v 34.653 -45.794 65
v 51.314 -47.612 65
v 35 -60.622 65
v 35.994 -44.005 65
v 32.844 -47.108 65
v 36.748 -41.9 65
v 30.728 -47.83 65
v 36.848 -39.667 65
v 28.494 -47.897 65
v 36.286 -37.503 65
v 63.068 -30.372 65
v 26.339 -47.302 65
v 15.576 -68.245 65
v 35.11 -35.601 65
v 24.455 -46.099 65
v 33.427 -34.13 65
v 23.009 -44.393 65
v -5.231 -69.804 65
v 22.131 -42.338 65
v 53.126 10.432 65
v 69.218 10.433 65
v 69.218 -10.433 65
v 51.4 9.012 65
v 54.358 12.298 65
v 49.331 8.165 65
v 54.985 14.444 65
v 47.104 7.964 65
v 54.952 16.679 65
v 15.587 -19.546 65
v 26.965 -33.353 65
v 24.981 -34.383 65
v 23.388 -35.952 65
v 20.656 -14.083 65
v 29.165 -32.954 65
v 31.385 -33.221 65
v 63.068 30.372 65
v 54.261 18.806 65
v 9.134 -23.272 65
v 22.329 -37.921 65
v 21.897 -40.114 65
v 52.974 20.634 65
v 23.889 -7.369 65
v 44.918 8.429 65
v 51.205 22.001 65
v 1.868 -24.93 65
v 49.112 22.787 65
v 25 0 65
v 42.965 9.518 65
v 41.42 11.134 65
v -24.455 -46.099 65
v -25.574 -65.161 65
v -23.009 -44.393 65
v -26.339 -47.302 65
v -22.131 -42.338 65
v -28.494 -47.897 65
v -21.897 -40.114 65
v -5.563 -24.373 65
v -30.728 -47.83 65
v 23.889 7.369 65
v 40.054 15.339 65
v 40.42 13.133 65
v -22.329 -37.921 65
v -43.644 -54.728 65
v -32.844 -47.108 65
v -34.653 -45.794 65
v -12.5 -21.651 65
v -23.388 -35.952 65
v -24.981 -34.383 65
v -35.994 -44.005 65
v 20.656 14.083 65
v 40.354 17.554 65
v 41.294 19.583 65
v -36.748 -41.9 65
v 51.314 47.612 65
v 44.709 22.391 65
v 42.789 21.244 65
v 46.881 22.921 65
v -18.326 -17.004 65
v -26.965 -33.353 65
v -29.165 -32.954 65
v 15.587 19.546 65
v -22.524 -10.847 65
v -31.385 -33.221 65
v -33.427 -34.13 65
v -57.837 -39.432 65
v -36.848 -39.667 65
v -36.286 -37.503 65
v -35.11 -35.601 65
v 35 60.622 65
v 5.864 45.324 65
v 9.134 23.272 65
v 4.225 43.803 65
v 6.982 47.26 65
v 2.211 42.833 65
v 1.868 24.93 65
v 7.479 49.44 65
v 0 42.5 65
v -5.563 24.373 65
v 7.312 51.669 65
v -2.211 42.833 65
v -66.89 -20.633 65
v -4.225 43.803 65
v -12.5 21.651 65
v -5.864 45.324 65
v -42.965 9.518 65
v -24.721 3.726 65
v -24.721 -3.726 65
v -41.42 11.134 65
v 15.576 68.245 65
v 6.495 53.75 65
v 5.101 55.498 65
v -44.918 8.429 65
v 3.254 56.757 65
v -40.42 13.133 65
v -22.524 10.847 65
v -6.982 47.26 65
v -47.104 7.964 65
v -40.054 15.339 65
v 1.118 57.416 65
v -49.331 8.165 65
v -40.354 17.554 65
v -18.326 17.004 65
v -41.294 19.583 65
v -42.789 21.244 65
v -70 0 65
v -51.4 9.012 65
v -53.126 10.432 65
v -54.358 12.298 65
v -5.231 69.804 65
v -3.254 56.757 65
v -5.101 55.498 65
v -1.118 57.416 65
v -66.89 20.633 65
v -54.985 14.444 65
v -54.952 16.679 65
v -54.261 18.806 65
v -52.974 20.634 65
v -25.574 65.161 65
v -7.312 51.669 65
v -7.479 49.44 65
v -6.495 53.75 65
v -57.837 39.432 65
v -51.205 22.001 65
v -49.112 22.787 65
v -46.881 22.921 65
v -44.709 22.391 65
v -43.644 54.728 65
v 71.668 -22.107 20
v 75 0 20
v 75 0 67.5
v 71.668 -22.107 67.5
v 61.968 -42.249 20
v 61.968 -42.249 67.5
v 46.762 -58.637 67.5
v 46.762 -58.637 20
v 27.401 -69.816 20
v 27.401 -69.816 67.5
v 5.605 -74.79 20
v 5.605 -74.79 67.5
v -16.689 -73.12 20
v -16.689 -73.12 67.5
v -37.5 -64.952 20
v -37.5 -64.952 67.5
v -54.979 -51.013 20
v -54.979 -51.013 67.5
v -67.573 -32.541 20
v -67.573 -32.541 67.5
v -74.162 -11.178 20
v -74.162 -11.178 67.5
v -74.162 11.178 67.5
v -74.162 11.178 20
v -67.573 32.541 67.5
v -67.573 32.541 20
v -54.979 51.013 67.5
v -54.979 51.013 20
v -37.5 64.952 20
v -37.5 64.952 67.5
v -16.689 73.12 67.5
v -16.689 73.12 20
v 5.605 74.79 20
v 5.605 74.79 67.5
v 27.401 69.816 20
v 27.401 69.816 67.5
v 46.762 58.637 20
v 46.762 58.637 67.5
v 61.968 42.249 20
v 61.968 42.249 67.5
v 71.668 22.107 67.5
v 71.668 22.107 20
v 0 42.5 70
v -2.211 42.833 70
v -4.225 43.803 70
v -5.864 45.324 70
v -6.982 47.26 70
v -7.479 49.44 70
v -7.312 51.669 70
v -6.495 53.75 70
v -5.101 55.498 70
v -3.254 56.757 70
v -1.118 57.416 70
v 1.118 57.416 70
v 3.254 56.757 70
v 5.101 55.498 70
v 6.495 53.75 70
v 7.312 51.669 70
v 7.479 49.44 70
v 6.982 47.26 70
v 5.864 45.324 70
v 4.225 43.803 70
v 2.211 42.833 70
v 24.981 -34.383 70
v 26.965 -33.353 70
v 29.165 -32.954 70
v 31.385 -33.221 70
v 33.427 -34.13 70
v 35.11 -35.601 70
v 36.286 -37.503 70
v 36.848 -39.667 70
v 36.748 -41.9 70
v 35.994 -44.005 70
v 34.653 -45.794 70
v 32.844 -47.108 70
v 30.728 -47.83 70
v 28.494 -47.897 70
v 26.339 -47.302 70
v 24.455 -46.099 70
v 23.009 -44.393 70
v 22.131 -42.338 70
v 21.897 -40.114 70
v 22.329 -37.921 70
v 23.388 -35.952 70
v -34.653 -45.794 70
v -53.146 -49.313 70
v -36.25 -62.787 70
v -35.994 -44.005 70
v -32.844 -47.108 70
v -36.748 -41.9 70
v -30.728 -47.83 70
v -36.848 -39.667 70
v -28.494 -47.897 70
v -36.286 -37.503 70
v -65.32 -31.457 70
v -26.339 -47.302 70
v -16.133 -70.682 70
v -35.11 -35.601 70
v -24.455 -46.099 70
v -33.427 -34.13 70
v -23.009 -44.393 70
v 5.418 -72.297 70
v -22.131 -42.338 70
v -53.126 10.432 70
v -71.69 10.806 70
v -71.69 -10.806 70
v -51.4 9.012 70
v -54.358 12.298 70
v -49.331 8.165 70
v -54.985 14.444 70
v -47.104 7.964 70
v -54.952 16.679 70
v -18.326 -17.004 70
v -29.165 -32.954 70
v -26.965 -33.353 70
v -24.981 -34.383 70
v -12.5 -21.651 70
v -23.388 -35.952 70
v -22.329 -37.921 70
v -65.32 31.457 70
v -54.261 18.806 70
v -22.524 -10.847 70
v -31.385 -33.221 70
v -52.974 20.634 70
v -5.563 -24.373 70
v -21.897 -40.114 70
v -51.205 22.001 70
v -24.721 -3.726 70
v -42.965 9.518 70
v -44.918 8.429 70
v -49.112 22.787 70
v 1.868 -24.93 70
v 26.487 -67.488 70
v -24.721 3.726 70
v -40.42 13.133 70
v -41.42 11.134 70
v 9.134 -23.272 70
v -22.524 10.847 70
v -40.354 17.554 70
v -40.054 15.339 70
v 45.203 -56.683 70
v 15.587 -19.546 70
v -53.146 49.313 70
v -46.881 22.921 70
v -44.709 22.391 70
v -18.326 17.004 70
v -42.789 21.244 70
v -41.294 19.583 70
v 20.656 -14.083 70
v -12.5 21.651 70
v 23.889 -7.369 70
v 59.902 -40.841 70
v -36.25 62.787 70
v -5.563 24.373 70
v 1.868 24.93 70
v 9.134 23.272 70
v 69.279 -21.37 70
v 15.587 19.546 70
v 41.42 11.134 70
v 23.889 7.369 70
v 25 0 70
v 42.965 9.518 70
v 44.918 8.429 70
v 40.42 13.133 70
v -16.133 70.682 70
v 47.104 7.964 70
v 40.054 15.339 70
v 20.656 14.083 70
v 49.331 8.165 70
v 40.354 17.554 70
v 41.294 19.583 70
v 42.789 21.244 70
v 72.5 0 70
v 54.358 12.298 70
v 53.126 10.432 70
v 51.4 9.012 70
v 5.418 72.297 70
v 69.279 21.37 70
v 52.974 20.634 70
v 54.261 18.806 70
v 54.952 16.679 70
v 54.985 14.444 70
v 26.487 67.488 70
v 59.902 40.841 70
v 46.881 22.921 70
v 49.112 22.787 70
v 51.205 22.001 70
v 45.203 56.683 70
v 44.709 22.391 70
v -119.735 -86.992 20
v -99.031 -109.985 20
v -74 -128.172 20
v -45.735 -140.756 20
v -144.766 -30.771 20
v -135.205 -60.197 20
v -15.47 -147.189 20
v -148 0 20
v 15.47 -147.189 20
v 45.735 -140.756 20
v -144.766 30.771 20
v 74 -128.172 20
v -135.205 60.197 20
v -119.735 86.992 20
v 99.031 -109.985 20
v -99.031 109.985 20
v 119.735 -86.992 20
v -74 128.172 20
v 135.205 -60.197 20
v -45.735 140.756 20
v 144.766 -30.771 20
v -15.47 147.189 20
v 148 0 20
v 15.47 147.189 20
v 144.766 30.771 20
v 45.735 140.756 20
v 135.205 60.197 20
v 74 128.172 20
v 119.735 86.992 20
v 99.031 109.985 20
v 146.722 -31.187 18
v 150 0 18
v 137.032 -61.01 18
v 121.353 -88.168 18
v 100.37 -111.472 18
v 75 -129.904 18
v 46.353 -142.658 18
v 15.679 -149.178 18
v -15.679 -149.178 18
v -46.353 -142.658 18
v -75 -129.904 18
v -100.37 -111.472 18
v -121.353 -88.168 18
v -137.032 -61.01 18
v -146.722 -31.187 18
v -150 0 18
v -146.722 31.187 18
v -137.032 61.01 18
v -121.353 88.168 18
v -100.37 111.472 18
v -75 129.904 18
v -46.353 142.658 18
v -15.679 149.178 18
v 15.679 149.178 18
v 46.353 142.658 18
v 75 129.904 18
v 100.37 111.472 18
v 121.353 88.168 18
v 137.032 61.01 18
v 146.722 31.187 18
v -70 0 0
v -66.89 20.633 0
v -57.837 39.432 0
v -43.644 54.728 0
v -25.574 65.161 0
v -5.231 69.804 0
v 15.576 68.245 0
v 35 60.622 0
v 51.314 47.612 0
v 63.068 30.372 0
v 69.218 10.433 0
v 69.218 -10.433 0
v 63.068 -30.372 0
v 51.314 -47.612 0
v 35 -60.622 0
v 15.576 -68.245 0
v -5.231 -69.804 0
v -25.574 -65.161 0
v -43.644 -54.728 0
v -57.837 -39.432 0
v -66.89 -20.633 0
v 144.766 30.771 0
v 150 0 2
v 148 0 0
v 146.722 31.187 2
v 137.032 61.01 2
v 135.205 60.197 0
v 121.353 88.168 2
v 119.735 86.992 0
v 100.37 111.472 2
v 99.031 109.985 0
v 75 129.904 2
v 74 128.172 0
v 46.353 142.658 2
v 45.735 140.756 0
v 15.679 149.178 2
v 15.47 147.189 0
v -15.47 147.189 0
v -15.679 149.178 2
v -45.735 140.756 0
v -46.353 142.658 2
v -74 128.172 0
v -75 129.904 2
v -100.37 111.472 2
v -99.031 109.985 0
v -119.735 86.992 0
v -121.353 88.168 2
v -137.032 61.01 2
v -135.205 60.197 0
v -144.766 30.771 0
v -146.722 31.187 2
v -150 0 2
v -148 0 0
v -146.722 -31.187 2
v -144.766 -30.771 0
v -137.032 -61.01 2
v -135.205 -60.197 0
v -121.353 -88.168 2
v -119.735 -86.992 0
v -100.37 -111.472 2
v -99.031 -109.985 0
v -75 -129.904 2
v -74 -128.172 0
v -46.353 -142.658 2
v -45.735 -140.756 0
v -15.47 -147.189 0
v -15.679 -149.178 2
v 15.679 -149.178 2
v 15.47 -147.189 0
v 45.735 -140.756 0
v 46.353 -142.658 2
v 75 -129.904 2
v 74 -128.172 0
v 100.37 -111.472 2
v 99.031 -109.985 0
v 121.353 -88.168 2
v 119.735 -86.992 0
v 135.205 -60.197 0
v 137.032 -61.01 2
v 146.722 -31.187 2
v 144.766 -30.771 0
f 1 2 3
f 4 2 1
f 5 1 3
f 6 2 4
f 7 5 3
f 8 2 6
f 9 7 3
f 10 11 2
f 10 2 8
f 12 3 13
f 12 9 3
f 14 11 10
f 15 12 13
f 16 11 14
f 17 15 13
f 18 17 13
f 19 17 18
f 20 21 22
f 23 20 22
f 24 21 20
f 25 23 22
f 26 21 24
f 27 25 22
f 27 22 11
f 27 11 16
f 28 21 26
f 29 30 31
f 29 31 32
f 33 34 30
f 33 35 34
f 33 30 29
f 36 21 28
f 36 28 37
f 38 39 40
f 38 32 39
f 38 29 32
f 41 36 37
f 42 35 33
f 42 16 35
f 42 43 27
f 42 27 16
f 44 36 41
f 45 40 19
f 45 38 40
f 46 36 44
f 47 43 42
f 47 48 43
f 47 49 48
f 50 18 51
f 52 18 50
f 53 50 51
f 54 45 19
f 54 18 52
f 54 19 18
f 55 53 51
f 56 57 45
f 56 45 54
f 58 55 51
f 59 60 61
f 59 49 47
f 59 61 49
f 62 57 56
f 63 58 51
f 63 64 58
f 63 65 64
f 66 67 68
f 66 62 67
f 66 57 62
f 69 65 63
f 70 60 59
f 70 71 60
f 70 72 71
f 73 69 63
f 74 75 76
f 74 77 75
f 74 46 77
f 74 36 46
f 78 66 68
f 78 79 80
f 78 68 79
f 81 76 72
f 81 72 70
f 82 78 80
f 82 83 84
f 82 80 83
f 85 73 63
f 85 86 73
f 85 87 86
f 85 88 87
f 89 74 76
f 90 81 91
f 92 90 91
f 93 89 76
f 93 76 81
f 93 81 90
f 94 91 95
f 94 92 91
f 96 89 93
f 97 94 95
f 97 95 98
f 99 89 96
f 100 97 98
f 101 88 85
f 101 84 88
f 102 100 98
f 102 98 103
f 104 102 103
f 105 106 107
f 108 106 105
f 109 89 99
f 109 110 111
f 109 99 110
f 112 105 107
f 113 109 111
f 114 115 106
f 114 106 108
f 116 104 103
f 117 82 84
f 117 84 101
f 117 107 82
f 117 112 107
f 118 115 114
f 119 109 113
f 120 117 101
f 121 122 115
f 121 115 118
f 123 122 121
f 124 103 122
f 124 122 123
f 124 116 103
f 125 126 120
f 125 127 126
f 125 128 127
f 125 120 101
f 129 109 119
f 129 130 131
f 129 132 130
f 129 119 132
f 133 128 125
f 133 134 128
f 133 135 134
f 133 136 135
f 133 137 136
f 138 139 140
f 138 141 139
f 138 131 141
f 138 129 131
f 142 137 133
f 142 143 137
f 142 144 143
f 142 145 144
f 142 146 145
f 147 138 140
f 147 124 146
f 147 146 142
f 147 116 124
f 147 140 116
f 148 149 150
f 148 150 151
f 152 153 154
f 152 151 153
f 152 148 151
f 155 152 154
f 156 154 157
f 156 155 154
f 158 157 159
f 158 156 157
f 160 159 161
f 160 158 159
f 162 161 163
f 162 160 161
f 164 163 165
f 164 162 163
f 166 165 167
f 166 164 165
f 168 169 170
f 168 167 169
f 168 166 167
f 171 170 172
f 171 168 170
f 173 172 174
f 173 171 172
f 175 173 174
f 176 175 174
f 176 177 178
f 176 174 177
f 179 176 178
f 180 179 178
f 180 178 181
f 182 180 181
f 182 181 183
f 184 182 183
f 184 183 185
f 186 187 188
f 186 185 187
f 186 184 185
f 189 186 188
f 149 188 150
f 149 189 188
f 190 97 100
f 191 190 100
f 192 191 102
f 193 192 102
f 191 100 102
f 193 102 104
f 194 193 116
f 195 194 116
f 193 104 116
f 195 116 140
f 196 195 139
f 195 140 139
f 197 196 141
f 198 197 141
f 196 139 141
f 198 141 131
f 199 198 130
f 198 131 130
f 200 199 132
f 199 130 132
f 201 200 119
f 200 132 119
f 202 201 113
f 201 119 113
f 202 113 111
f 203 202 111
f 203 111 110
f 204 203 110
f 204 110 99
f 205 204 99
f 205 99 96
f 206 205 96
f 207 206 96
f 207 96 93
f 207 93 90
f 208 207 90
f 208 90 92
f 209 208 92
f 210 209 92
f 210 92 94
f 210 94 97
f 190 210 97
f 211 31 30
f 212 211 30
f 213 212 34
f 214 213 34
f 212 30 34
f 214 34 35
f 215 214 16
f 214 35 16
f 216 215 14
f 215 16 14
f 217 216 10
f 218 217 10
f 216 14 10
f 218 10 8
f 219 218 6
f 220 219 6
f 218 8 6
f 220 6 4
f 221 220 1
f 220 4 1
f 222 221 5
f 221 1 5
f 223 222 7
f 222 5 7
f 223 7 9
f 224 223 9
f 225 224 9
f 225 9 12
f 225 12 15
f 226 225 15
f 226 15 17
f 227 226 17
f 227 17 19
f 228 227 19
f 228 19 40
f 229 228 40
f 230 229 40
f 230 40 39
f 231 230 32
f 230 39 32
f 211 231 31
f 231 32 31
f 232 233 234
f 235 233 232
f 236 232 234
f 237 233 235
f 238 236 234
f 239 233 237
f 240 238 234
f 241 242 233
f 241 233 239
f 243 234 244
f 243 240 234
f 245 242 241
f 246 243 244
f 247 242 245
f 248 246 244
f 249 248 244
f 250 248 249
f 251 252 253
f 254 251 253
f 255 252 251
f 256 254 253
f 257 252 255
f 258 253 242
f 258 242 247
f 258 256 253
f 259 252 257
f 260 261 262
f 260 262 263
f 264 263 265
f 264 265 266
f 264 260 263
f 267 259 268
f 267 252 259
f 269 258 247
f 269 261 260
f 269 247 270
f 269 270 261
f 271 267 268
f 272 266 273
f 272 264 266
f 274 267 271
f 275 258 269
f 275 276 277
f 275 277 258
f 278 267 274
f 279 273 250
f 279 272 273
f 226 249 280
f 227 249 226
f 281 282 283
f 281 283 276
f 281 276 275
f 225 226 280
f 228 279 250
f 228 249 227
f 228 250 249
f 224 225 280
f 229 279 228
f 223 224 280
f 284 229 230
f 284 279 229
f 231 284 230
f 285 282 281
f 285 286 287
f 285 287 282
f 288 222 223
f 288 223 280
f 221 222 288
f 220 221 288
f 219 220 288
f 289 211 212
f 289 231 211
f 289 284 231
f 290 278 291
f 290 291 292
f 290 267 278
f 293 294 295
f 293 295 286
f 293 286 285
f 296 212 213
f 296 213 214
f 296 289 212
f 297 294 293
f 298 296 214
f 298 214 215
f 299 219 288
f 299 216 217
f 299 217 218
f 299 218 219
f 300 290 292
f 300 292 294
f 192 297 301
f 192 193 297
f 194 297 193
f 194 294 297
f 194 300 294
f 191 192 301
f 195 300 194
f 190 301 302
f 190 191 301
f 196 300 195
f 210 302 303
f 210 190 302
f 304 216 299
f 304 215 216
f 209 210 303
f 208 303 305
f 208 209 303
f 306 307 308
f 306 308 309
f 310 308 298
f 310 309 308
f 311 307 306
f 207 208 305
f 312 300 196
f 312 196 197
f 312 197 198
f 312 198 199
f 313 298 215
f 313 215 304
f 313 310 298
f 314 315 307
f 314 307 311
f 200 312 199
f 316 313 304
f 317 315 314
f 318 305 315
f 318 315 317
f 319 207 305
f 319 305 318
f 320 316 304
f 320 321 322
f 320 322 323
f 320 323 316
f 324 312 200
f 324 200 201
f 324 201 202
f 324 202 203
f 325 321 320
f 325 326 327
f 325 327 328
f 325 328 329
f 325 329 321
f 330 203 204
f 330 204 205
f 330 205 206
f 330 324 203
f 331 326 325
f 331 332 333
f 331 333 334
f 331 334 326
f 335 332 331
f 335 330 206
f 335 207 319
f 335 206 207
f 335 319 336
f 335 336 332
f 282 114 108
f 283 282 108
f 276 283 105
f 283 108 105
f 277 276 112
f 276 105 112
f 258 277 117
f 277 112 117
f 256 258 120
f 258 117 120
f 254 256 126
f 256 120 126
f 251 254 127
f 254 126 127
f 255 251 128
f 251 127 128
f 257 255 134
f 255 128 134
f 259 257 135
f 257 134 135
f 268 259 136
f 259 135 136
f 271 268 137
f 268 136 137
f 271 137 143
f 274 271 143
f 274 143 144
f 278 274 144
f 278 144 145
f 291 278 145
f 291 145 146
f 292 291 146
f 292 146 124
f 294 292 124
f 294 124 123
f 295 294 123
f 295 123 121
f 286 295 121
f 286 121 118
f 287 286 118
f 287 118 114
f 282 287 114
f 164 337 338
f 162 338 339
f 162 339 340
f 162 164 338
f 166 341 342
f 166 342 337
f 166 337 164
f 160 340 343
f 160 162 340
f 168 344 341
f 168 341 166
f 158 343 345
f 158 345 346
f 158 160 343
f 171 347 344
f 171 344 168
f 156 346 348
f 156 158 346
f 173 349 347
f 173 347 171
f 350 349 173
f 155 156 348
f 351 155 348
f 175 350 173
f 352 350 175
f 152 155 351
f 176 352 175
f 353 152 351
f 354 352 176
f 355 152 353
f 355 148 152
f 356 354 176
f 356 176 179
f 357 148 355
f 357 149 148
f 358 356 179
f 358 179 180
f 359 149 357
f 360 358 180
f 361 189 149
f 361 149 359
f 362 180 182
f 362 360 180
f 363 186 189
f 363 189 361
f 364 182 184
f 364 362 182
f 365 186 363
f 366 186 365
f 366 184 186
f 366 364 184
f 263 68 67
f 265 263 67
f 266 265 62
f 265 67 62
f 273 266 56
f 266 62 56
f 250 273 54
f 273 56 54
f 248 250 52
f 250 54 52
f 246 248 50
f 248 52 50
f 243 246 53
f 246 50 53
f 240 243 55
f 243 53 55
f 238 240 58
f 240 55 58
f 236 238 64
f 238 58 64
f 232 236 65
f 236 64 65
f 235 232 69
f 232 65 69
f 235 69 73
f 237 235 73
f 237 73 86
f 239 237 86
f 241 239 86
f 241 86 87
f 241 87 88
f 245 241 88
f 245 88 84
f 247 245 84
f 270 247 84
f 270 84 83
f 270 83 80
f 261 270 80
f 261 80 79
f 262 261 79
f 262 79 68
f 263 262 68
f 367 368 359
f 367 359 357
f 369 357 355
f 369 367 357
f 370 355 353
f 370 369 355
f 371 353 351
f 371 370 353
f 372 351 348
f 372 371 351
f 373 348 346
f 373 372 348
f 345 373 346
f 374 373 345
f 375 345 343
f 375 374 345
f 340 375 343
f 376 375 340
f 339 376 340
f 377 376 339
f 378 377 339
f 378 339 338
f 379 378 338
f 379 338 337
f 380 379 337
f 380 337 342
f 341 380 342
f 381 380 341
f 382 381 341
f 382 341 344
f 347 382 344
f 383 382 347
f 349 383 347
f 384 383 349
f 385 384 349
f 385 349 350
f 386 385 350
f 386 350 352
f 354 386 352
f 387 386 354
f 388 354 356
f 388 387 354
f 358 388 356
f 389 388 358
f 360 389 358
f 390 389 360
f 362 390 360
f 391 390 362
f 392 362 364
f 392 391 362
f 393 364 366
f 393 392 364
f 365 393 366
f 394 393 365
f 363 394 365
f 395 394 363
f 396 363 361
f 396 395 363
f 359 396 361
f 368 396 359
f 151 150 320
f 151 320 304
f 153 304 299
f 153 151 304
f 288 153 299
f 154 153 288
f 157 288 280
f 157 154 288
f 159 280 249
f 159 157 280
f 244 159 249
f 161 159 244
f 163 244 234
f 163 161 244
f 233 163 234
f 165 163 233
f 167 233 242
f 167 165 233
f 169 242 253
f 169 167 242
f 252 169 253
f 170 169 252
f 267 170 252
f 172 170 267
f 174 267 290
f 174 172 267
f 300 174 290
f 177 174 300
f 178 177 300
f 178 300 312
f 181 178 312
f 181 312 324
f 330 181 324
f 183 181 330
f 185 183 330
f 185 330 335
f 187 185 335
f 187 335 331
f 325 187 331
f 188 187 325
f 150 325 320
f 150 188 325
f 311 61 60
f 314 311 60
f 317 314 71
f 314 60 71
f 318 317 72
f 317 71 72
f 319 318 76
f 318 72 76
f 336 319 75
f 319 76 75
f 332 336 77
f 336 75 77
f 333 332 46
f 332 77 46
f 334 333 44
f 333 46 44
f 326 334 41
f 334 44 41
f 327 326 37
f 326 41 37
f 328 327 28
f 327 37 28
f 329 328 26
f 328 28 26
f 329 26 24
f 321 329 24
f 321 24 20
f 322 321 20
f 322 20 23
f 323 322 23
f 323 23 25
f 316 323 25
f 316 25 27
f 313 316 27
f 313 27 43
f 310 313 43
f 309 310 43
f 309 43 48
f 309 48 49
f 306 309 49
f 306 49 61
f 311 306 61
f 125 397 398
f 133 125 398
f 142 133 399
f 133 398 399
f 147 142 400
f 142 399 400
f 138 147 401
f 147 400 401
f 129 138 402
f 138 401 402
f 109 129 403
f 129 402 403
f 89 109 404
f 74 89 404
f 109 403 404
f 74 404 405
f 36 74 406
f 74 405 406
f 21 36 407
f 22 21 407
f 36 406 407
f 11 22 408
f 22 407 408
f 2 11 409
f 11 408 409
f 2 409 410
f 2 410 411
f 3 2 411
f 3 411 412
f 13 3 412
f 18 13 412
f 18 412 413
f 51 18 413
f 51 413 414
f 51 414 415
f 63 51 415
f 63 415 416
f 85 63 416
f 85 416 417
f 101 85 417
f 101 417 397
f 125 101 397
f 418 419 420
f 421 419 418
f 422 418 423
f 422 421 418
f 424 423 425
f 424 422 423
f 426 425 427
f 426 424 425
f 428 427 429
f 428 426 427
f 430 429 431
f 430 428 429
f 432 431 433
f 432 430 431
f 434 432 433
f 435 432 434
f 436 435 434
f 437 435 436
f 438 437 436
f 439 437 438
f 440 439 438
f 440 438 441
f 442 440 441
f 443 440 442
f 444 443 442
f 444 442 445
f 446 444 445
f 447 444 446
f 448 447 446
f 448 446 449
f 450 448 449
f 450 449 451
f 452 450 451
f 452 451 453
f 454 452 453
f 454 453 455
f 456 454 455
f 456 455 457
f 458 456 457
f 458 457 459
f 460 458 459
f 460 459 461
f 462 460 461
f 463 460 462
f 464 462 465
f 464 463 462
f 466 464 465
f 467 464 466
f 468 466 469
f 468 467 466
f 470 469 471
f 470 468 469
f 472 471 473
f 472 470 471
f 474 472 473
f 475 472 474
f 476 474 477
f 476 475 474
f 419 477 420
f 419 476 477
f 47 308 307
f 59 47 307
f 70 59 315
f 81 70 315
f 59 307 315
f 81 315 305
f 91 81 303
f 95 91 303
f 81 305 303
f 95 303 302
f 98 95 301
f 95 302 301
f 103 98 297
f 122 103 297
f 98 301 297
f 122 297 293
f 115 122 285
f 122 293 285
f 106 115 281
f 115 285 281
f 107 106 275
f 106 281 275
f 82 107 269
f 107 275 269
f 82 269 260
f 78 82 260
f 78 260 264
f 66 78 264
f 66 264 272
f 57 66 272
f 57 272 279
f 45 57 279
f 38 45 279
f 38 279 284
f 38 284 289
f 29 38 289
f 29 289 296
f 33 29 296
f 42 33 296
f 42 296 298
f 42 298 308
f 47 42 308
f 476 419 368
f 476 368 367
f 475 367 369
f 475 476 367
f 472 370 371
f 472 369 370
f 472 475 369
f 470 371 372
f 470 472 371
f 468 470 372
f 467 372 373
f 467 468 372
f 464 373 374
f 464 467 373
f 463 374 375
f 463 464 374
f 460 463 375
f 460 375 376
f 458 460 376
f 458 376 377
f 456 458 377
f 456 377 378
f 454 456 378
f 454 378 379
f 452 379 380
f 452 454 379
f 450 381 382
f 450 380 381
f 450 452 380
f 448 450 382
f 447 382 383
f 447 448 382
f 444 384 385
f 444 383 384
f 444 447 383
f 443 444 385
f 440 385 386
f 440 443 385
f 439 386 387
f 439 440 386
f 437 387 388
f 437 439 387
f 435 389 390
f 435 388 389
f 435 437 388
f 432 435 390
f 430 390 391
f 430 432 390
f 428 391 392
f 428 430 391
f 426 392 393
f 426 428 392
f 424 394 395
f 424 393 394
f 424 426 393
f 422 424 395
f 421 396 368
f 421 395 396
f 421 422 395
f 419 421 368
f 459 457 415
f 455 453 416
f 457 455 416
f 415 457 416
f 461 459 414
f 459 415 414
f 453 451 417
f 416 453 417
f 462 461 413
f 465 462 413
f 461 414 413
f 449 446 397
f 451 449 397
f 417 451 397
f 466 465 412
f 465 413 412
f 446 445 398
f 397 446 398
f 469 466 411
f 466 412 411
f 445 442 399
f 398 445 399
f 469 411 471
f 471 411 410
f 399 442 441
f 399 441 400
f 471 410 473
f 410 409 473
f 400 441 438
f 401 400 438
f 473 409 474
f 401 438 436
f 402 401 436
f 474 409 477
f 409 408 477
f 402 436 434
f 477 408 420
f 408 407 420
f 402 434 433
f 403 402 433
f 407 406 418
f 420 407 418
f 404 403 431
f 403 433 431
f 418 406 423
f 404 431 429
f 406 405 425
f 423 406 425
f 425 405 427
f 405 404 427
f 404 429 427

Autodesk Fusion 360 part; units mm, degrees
sketch "Sketch1" plane through (0, 0, 0) normal (0, 0, 1) x (1, 0, 0) in component "Disk"
  circle A0 centre (0, 0) radius 150
  dimension "d1" = 300
extrude "Extrude1" add sketch "Sketch1" along normal blind 20 in component "Disk"
sketch "Sketch2" plane through (0, 0, 20) normal (0, 0, 1) x (1, 0, 0) in component "Disk"
  circle A0 centre (0, 0) radius 150
  circle A1 centre (0, 0) radius 75
  dimension "d4" = 150
extrude "Extrude2" add sketch "Sketch2" along normal blind 50 contours A1 in component "Disk"
sketch "Sketch3" plane through (0, 0, 0) normal (0, 0, -1) x (-1, 0, 0) in component "Disk"
  circle A0 centre (0, 0) radius 150
  circle A1 centre (0, 0) radius 75
  circle A2 centre (0, 0) radius 70
  dimension "d7" = -5
extrude "Extrude3" cut sketch "Sketch3" against normal up to surface (65 mm away) contours A2 in component "Disk"
chamfer "Chamfer1" distance 2.5 angle 45 1 edges at (-69.9246, -27.1212, 70) in component "Disk"
chamfer "Chamfer2" distance 2 angle 45 2 edges at (-139.8491, -54.2423, 20) (-139.8491, -54.2423, 0) in component "Disk"
sketch "Sketch4" plane through (0, 0, 70) normal (0, 0, 1) x (1, 0, 0) in component "Disk"
  circle A0 centre (0, 0) radius 72.5
  circle A1 centre (0, 0) radius 25
  dimension "d12" = 50
extrude "Extrude4" cut sketch "Sketch4" against normal up to surface (5 mm away) contours A1 in component "Disk"
sketch "Sketch5" plane through (0, 0, 70) normal (0, 0, 1) x (1, 0, 0) in component "Disk"
  circle A0 centre (0, 0) radius 25
  circle A1 centre (0, 0) radius 72.5
  point P0 (0, 50)
  dimension "d15" = 50
hole "Hole1" at (0, 50, 70) direction (0, 0, -1) diameter 15 depth 5 tip angle 118 in component "Disk"
pattern_circular "C-Pattern1" count 5 over 360 about axis through (0, 0, 70) along (0, 0, -1) of "Hole1" in component "Disk"
component "Disk" placed x (1, 0, 0) y (0, 1, 0) z (0, 0, 1) at (0, 0, 0)
